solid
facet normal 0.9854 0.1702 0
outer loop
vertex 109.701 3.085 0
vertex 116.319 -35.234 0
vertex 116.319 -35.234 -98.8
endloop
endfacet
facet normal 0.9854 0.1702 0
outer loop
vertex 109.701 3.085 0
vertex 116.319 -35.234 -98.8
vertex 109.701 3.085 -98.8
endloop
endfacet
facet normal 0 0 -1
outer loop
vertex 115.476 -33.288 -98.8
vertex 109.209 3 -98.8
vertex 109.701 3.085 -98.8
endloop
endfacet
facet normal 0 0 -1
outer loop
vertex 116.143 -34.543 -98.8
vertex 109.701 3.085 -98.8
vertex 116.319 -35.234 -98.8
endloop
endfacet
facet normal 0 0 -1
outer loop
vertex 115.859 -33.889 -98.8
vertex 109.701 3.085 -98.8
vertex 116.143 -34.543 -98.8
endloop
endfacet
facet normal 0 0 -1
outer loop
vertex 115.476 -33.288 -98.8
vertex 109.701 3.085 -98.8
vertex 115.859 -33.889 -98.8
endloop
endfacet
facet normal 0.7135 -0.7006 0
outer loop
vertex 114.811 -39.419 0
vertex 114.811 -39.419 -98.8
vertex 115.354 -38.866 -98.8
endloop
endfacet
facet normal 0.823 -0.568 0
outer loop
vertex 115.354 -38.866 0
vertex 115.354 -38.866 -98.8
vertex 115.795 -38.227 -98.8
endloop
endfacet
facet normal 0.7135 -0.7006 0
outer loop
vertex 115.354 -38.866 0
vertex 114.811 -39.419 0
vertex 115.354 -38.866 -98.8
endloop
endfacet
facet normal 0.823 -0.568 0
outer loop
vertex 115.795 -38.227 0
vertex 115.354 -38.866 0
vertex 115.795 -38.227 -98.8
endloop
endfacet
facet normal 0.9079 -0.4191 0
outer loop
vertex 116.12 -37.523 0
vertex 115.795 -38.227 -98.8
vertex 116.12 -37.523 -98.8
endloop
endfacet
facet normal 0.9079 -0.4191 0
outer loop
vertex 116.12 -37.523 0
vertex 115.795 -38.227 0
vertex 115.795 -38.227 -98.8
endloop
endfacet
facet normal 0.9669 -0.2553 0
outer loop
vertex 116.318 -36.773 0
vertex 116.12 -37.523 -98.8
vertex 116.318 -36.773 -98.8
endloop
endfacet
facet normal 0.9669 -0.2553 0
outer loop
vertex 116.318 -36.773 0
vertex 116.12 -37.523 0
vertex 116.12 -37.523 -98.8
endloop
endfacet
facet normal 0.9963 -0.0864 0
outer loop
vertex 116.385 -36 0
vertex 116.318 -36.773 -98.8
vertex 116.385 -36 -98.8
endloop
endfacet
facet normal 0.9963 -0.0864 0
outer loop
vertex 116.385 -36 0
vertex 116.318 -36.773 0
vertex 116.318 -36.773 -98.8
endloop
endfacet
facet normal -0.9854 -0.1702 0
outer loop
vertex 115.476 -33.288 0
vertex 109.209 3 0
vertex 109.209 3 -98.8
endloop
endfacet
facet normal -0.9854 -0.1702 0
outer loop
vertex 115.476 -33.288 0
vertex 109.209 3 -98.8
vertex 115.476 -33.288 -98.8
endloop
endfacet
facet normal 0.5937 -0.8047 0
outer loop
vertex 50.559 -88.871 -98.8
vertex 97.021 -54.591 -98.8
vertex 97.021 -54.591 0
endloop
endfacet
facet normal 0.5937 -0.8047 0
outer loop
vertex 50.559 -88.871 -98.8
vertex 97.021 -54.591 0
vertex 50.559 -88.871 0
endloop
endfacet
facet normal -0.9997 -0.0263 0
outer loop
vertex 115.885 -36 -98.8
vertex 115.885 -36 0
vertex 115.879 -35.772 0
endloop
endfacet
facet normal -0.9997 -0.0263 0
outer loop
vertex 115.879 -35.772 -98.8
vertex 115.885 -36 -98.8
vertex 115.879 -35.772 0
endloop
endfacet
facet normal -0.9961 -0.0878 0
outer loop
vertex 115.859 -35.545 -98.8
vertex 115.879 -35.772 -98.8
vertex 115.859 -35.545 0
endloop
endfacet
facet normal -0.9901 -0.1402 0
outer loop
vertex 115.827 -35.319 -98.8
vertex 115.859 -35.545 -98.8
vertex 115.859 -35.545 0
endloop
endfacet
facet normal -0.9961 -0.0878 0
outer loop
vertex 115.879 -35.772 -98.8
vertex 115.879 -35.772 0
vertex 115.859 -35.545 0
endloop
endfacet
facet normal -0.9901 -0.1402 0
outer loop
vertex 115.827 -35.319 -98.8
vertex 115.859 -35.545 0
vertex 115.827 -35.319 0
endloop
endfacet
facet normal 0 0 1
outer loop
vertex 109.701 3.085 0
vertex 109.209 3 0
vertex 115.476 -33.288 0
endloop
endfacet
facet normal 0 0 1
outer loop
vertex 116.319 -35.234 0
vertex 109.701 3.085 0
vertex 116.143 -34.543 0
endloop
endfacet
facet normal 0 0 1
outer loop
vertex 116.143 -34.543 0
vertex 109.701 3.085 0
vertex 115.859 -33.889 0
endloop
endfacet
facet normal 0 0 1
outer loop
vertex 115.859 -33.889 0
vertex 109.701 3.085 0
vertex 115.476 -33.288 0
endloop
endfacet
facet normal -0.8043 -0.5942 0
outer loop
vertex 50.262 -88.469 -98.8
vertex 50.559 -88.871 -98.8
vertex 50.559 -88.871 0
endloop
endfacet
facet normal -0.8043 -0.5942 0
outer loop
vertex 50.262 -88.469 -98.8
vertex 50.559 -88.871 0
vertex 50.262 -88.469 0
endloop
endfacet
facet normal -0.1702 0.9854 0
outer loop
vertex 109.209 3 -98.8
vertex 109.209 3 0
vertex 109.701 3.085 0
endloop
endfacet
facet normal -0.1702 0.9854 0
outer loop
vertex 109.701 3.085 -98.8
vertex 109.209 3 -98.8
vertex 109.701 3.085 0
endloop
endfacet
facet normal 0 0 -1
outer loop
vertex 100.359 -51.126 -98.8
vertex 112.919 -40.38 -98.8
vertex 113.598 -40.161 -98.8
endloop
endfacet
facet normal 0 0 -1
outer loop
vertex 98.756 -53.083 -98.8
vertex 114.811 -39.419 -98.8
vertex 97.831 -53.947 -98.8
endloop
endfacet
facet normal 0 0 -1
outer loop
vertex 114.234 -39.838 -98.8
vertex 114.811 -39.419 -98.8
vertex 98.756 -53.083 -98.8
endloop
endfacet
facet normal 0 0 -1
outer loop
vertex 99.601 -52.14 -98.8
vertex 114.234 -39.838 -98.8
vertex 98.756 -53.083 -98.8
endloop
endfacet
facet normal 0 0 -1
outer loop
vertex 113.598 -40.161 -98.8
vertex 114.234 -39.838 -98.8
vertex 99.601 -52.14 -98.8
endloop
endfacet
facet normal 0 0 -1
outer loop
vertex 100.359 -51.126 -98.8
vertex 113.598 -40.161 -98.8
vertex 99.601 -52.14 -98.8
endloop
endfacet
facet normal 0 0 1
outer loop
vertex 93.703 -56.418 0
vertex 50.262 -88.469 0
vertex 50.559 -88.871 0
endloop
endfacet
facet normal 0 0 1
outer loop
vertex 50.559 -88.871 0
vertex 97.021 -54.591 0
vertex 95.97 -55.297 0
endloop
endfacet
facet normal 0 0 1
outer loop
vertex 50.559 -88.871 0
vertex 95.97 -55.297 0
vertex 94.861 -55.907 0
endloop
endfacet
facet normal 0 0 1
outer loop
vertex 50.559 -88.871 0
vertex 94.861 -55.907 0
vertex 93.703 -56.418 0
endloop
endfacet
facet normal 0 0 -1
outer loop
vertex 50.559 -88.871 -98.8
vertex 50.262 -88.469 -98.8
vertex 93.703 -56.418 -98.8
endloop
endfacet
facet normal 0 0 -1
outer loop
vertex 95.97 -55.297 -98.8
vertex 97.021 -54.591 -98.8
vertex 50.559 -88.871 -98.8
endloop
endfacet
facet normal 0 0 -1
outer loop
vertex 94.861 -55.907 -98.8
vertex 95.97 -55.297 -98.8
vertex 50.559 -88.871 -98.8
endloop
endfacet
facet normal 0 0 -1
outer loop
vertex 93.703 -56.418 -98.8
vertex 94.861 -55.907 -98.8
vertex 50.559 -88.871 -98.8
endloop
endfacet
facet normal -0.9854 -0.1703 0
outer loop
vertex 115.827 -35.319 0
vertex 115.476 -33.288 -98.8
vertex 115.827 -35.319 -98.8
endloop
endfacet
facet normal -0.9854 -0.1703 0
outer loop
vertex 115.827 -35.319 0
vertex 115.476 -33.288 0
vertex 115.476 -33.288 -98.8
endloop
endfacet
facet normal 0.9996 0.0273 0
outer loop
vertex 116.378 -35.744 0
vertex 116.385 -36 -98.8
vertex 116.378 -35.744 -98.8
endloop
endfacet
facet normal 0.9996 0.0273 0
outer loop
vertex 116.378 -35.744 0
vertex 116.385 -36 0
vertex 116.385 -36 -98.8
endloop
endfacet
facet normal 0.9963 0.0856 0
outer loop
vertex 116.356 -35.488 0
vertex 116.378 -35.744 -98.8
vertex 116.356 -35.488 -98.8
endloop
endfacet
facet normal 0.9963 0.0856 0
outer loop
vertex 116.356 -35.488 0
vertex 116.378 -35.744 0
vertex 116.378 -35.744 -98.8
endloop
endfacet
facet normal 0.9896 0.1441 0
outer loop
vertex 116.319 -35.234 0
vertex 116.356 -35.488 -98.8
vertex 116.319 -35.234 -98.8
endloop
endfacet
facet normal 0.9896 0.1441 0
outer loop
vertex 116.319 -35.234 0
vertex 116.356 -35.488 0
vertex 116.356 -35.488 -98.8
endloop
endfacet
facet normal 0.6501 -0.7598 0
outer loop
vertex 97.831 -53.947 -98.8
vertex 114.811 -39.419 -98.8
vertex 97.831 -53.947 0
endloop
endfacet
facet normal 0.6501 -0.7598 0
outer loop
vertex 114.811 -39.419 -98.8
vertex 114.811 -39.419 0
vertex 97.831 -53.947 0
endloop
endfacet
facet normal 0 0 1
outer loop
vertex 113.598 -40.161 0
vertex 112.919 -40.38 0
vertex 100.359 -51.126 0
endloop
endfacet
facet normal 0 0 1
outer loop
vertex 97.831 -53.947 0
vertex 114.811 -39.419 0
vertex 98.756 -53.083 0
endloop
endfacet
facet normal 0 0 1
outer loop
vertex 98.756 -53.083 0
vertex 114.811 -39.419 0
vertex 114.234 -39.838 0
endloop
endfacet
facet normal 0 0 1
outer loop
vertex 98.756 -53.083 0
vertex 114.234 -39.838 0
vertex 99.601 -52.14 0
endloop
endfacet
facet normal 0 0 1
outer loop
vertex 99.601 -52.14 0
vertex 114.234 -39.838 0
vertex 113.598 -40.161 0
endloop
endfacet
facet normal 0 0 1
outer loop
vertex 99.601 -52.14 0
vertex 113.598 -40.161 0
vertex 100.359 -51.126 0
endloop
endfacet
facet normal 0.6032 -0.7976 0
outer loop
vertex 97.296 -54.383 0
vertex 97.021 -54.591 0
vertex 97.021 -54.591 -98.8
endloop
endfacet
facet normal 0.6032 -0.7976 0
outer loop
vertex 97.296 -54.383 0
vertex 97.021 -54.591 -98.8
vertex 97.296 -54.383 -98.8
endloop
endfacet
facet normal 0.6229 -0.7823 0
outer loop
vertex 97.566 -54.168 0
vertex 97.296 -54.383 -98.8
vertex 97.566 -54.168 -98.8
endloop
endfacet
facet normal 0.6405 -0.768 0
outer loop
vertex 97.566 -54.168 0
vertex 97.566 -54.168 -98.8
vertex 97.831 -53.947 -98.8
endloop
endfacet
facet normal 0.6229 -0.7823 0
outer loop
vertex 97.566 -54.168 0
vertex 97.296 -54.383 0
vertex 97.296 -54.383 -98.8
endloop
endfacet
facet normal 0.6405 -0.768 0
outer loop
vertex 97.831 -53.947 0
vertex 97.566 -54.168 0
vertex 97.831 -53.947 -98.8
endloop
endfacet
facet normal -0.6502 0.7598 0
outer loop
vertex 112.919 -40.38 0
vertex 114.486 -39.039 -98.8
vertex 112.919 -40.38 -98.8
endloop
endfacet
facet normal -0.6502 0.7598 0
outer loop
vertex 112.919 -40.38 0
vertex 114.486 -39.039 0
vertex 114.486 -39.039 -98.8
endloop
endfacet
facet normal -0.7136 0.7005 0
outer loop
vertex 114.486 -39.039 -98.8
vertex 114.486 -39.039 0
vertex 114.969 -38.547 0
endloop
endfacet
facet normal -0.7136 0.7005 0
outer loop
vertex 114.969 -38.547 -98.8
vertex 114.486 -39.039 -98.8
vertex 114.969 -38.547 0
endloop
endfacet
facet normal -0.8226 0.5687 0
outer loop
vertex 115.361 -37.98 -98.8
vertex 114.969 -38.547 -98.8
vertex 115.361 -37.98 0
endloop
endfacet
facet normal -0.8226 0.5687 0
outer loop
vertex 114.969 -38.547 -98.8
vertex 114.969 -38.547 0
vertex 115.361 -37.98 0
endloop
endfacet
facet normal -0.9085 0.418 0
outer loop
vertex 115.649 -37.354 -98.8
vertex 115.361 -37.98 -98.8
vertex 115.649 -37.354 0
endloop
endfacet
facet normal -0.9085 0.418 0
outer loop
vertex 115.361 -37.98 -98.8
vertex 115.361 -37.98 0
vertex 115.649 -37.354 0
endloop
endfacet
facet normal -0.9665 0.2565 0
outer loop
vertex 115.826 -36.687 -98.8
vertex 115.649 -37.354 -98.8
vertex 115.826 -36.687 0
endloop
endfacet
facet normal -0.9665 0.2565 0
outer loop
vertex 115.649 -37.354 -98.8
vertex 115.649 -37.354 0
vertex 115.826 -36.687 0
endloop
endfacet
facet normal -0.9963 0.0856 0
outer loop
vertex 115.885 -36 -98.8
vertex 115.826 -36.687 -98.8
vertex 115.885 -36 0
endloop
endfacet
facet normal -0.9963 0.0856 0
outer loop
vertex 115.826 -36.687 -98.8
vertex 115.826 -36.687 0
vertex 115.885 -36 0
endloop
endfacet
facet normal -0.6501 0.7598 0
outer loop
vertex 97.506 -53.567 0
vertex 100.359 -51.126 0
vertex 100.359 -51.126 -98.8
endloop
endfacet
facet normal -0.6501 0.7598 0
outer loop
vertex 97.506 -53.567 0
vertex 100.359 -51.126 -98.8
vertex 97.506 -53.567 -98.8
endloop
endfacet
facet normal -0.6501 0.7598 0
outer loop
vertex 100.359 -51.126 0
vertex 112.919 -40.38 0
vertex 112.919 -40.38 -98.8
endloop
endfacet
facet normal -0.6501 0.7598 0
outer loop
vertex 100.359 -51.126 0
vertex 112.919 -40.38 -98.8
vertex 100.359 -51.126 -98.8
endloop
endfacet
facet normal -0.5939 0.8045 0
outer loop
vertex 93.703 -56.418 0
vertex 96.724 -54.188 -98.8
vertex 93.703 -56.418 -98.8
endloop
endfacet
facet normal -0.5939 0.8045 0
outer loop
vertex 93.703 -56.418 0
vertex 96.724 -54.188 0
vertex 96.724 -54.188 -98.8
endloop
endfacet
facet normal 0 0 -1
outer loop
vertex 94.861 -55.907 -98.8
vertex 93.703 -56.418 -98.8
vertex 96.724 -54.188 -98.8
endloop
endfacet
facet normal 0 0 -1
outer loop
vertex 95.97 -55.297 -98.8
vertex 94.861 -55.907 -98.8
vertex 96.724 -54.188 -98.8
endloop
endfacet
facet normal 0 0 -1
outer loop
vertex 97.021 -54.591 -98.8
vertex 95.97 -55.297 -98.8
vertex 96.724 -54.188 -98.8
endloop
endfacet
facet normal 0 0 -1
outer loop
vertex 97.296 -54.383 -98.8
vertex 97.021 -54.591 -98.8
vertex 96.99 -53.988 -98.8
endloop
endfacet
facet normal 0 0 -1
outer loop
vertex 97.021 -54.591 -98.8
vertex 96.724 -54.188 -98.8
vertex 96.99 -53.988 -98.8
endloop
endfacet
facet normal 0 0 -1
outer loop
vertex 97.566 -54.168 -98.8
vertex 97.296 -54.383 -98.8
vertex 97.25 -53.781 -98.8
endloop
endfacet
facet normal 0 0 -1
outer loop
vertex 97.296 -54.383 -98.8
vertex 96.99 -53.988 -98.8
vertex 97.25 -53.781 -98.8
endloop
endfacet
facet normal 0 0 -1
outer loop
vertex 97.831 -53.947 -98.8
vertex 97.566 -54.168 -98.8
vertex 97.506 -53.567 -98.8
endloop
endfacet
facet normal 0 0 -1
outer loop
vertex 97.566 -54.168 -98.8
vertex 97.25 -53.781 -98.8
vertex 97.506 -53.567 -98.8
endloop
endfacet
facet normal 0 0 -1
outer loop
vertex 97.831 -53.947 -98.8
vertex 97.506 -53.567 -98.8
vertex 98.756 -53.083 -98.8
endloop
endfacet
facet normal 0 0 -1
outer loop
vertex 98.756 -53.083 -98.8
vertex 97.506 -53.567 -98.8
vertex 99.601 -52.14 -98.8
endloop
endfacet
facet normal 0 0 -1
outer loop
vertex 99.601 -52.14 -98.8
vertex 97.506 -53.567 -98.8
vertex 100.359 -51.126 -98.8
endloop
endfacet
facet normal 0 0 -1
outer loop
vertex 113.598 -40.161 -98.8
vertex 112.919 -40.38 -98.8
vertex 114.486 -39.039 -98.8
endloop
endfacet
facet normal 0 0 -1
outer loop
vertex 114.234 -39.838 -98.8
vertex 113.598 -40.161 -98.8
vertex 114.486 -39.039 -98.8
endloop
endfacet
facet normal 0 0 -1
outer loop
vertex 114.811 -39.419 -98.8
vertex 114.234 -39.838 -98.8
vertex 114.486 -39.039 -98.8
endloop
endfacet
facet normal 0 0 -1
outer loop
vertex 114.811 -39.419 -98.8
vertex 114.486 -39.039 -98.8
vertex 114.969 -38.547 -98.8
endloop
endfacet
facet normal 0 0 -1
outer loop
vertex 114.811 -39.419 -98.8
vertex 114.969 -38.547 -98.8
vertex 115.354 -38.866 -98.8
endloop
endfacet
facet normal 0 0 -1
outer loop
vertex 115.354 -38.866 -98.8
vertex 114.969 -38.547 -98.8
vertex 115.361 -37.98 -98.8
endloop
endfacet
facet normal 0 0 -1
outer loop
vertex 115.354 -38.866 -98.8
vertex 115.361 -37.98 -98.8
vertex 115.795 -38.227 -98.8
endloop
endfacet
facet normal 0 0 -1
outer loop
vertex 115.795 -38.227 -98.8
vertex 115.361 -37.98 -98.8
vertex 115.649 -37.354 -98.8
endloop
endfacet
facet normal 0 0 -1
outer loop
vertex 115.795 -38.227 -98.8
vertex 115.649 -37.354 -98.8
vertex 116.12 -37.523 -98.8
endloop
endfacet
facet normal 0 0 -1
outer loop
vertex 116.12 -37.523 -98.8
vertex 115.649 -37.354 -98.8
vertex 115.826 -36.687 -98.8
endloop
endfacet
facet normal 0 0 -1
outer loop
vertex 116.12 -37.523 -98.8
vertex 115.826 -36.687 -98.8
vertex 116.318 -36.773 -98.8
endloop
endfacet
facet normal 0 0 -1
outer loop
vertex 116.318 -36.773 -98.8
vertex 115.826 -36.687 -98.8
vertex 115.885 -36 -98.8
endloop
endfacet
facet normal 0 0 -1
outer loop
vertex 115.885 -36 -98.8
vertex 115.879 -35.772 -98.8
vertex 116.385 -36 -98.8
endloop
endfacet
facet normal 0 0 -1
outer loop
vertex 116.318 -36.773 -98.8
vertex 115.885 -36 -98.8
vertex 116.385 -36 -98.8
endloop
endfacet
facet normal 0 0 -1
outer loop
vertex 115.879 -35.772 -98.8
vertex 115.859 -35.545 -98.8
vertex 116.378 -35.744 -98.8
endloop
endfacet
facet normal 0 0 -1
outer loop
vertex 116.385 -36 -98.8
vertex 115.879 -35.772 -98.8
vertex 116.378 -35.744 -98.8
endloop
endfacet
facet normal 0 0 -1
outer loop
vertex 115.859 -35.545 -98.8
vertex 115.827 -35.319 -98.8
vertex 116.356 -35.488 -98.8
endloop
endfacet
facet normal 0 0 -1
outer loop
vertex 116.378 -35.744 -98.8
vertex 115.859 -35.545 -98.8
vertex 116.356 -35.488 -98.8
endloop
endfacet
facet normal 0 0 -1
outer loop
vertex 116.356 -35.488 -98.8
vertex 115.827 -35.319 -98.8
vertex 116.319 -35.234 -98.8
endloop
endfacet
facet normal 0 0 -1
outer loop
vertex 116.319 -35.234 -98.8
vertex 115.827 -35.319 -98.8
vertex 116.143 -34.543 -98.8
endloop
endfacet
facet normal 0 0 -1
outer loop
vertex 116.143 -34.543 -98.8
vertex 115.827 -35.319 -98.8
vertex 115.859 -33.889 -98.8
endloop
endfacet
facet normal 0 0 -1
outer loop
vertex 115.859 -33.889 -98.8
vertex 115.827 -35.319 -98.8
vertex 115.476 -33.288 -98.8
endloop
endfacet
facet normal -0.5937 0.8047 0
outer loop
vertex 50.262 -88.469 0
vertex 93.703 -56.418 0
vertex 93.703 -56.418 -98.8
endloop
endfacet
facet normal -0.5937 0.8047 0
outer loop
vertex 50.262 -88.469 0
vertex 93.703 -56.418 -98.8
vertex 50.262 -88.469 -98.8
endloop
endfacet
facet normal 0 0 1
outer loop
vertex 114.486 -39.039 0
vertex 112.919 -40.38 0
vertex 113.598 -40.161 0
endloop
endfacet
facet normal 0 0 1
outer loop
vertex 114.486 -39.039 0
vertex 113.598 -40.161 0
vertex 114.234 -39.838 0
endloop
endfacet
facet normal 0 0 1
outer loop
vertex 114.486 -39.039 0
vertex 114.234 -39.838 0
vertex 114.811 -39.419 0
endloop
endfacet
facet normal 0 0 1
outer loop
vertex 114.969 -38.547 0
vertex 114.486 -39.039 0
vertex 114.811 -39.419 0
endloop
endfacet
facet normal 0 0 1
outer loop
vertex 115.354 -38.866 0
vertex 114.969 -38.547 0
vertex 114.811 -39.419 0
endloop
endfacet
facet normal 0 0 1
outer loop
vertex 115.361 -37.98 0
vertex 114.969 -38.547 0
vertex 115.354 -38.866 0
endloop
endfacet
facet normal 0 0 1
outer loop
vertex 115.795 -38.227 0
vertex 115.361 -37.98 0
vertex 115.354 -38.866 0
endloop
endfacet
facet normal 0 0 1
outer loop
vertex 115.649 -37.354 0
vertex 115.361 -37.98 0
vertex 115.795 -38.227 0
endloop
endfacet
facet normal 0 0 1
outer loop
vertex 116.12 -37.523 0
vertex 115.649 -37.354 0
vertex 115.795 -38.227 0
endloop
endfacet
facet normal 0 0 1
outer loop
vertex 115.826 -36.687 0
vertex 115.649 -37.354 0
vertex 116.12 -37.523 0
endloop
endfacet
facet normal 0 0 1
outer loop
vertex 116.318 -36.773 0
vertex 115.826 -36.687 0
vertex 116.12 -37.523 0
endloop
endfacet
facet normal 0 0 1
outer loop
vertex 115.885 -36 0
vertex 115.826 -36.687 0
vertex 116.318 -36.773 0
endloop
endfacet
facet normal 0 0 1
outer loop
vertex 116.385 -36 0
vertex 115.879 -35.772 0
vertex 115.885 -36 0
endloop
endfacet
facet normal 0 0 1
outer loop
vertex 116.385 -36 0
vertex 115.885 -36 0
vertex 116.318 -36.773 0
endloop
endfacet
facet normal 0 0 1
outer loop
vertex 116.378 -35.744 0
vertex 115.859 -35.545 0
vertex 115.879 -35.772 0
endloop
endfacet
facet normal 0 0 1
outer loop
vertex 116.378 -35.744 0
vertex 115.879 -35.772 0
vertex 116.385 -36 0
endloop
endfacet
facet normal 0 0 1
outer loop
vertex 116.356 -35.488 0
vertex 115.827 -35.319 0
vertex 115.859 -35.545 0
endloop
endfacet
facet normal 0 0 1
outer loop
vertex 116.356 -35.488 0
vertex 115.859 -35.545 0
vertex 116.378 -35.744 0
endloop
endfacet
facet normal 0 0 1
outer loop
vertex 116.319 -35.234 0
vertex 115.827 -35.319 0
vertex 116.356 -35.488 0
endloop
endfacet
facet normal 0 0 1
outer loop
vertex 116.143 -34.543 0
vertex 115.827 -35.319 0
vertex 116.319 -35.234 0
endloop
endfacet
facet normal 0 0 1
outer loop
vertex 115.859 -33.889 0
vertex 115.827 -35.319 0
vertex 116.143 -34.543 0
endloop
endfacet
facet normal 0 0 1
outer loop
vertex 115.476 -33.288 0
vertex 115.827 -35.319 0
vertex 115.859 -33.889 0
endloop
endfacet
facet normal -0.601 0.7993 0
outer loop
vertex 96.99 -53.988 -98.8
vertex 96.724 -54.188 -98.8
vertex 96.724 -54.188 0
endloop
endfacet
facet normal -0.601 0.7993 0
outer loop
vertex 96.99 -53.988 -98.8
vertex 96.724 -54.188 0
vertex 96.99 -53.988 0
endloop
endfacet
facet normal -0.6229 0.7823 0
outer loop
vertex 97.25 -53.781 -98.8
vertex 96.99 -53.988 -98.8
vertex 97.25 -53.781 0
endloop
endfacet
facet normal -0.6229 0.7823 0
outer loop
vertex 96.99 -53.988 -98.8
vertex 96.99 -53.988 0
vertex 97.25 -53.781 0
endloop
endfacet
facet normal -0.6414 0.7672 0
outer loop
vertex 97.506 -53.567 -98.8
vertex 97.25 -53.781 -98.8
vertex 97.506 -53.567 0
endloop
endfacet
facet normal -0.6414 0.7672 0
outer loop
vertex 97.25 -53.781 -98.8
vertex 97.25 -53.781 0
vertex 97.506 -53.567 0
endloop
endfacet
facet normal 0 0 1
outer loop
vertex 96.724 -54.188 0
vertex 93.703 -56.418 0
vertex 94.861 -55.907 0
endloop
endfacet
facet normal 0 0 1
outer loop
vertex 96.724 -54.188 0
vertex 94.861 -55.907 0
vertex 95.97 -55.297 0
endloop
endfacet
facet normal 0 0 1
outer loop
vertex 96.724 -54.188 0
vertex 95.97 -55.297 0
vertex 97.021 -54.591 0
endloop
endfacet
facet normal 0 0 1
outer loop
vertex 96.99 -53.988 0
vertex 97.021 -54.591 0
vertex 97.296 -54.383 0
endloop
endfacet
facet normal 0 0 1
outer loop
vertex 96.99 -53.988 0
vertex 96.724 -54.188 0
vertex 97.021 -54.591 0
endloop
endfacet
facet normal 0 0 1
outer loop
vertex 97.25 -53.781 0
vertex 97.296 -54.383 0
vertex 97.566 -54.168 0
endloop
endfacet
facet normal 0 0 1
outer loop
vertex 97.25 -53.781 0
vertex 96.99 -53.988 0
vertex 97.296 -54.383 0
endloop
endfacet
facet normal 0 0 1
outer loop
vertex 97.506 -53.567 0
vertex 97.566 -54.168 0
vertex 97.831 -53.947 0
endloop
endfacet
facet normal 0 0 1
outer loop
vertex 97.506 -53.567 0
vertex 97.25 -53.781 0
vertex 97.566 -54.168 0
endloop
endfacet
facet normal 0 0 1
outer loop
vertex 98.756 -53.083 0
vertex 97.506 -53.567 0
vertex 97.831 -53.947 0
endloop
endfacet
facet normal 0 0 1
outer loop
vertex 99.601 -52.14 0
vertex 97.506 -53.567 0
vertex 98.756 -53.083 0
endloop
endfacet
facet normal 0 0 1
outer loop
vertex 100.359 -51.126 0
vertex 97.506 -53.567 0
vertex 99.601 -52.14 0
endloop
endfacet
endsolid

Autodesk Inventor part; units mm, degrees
ref_plane "YZ Plane" through (0, 0, 0) normal (1, 0, 0) x (0, 1, 0)
ref_plane "XZ Plane" through (0, 0, 0) normal (0, 1, 0) x (-1, 0, 0)
ref_plane "XY Plane" through (0, 0, 0) normal (0, 0, 1) x (1, 0, 0)
sketch "スケッチ1" plane through (0, 0, 0) normal (0, 0, 1) x (1, 0, 0)
  line L0 (109.2087, 3) -> (109.2087, 0)
  line L1 (109.2087, -3) -> (109.2087, 0)
  circle A0 centre (111.885, -36) radius 4
  circle A1 centre (47.8869, -85.25) radius 4
  line L2 (109.2087, 3) -> (115.8267, -35.3193)
  line L3 (116.3194, -35.2342) -> (108.7087, 8.833)
  line L4 (108.7087, 8.833) -> (108.7087, 0)
  circle A2 centre (111.885, -36) radius 4.5
  line L5 (109.2087, 3) -> (109.7014, 3.0851)
  circle A3 centre (88.5017, -43.0436) radius 13.85
  line L6 (96.7244, -54.1885) -> (50.2617, -88.4688)
  line L7 (114.4855, -39.0393) -> (97.5058, -53.5673)
  line L8 (114.8106, -39.4192) -> (97.8309, -53.9472)
  circle A4 centre (88.5017, -43.0436) radius 14.35
  line L9 (97.0213, -54.5908) -> (50.5586, -88.8711)
  line L10 (50.5586, -88.8711) -> (50.2617, -88.4688)
  point P0 (0, 0)
  dimension "d0" = 0.5
  dimension "d1" = 0.5
  dimension "d2" = 0.5
  dimension "d3" = 0.5
  dimension "d4" = 0.5
extrude "押し出し1" add sketch "スケッチ1" against normal blind 98.8 contours A0 L2 A2 L7 | L2 L5 L3 A2 | A2 L8 A4 L7 | A4 L6 A3 L7 | L9 L10 L6 A4 picked at (113.6675, -39.86) picked at (95.0962, -55.5046)
properties part number "機体ケツ防護カバーver2" material "ポリカーボネート、クリア"
